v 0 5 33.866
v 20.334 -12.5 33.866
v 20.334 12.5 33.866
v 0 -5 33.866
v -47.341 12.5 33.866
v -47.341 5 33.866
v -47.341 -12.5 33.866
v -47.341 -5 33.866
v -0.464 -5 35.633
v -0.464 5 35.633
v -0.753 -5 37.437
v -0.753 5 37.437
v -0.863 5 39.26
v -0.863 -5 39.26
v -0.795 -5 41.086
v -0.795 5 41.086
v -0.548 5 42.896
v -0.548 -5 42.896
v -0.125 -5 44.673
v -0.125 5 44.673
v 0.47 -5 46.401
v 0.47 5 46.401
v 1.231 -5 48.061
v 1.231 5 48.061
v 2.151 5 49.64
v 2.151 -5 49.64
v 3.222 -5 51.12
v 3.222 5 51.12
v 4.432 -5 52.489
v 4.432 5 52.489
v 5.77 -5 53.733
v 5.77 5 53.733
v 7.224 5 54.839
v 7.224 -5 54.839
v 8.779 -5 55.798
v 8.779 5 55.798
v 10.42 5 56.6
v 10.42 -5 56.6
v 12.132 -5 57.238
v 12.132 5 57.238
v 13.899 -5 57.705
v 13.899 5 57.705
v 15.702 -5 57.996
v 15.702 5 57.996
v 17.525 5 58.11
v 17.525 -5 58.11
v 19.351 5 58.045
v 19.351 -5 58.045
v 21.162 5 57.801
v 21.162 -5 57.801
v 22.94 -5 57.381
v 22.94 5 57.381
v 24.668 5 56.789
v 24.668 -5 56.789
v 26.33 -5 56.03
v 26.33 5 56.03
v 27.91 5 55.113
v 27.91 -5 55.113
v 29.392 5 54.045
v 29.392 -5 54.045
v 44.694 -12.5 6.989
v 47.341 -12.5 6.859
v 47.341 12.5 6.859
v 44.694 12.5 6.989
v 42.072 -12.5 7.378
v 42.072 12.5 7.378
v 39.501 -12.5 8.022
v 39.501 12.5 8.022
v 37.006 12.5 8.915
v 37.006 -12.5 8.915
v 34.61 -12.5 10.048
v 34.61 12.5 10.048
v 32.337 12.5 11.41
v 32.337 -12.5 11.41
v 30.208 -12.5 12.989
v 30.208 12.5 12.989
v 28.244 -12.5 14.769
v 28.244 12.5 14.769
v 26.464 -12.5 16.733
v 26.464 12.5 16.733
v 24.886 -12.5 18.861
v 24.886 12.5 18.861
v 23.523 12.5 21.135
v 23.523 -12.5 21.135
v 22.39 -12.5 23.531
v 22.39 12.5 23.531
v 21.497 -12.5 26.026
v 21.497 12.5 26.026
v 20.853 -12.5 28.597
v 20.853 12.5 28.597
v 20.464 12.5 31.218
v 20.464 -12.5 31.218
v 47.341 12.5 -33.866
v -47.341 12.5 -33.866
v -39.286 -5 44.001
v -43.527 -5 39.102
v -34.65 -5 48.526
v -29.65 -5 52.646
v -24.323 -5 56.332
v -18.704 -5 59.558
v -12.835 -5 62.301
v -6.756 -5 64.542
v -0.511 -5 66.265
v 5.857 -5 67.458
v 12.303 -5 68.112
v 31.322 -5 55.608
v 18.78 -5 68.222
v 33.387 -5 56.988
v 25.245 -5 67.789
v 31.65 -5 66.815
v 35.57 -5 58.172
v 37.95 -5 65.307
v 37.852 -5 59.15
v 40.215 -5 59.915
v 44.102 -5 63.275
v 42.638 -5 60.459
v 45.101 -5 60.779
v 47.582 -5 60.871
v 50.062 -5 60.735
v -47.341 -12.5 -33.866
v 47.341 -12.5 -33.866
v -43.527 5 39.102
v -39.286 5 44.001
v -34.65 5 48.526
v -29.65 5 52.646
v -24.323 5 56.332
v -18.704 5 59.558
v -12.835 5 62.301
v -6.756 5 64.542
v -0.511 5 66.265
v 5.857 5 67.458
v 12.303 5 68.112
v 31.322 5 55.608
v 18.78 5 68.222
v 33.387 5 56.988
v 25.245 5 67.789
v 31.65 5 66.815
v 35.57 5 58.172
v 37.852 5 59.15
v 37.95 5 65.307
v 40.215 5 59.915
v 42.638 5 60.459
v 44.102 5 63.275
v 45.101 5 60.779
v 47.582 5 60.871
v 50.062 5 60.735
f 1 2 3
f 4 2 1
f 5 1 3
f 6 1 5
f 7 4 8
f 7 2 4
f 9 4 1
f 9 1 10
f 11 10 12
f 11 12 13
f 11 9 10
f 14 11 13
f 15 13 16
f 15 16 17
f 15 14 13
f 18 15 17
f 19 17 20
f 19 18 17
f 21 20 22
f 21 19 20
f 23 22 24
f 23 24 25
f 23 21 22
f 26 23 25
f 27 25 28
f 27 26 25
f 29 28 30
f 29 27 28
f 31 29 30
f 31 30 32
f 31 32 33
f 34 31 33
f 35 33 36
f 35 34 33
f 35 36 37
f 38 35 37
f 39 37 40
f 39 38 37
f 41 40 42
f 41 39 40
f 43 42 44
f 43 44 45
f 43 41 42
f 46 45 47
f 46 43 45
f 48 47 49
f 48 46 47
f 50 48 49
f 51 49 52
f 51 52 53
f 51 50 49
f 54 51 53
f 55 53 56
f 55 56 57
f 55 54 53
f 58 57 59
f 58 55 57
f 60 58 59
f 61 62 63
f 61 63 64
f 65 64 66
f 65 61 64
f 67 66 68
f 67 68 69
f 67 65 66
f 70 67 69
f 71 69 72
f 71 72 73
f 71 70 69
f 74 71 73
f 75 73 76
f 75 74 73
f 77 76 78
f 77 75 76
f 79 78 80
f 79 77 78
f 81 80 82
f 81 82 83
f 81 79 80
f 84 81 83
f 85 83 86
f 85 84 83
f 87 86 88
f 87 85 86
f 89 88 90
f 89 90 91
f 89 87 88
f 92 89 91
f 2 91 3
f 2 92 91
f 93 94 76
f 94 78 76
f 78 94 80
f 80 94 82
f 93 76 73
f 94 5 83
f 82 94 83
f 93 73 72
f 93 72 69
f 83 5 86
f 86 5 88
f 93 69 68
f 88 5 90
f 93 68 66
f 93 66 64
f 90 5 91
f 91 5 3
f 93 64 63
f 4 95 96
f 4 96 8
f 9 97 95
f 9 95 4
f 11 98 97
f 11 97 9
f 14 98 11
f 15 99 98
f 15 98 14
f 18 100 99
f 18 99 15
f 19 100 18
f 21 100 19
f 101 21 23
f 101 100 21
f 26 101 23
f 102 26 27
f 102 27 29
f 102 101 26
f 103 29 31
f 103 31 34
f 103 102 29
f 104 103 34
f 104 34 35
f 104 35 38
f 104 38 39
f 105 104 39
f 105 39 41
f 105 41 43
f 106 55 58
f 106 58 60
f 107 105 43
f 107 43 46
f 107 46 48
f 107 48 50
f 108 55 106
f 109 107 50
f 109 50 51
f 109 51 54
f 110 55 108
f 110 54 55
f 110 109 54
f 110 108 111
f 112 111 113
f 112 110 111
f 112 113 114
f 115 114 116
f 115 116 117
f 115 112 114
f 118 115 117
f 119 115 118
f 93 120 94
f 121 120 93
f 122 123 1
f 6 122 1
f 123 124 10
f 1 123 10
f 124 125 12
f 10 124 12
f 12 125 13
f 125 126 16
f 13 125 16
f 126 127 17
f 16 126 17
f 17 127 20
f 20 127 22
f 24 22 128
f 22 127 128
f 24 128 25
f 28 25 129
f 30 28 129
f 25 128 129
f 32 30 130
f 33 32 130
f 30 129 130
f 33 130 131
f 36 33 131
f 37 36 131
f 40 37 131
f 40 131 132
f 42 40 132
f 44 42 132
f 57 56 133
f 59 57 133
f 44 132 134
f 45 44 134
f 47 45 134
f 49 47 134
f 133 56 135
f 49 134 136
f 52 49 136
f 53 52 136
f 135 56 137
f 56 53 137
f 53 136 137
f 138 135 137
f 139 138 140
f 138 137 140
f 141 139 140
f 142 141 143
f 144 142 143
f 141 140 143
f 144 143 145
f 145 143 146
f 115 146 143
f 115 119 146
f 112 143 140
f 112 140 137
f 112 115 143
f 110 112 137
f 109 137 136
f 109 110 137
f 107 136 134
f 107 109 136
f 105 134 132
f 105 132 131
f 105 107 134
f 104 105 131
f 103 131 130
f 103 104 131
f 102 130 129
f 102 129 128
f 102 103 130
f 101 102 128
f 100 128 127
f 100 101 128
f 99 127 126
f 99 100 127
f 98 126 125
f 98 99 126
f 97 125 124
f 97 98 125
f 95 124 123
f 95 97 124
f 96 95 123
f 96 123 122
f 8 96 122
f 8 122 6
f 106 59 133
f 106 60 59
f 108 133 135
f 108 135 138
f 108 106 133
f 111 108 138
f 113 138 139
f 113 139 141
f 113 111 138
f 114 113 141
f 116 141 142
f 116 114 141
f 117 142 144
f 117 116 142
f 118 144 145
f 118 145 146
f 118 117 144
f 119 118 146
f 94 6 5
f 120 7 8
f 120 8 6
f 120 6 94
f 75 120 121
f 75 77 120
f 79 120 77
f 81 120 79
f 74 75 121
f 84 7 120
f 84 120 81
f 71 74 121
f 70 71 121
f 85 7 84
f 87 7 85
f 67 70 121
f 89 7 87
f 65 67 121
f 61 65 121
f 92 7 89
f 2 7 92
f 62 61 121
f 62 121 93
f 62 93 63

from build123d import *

# Parameters (mm, degrees)
F1_DEPTH = 12.5
F2_DEPTH = 5


with BuildPart() as f1:
    # F0 (on Front) → F1 (new body, symmetric)
    with BuildSketch(Plane.XZ):
        with BuildLine():
            Line((-47.340788, -33.865508), (47.340788, -33.865508))
            Line((47.340788, -33.865508), (47.340788, 6.859001))
            ThreePointArc((47.340788, 6.859001), (28.244304, 14.769024), (20.334281, 33.865508))
            Line((20.334281, 33.865508), (0, 33.865508))
            Line((0, 33.865508), (-47.340788, 33.865508))
            Line((-47.340788, 33.865508), (-47.340788, -33.865508))
        make_face()
    extrude(amount=F1_DEPTH, both=True)

    # F0 (on Front) → F2 (join, symmetric)
    with BuildSketch(Plane.XZ):
        with BuildLine():
            ThreePointArc((50.061827, 60.734585), (-3.651514, 65.469078), (-47.340788, 33.865508))
            Line((-47.340788, 33.865508), (0, 33.865508))
            ThreePointArc((0, 33.865508), (7.223757, 54.839315), (29.392478, 54.044942))
            ThreePointArc((29.392478, 54.044942), (39.024823, 59.55979), (50.061827, 60.734585))
        make_face()
    extrude(amount=F2_DEPTH, both=True)


solid = f1.part
